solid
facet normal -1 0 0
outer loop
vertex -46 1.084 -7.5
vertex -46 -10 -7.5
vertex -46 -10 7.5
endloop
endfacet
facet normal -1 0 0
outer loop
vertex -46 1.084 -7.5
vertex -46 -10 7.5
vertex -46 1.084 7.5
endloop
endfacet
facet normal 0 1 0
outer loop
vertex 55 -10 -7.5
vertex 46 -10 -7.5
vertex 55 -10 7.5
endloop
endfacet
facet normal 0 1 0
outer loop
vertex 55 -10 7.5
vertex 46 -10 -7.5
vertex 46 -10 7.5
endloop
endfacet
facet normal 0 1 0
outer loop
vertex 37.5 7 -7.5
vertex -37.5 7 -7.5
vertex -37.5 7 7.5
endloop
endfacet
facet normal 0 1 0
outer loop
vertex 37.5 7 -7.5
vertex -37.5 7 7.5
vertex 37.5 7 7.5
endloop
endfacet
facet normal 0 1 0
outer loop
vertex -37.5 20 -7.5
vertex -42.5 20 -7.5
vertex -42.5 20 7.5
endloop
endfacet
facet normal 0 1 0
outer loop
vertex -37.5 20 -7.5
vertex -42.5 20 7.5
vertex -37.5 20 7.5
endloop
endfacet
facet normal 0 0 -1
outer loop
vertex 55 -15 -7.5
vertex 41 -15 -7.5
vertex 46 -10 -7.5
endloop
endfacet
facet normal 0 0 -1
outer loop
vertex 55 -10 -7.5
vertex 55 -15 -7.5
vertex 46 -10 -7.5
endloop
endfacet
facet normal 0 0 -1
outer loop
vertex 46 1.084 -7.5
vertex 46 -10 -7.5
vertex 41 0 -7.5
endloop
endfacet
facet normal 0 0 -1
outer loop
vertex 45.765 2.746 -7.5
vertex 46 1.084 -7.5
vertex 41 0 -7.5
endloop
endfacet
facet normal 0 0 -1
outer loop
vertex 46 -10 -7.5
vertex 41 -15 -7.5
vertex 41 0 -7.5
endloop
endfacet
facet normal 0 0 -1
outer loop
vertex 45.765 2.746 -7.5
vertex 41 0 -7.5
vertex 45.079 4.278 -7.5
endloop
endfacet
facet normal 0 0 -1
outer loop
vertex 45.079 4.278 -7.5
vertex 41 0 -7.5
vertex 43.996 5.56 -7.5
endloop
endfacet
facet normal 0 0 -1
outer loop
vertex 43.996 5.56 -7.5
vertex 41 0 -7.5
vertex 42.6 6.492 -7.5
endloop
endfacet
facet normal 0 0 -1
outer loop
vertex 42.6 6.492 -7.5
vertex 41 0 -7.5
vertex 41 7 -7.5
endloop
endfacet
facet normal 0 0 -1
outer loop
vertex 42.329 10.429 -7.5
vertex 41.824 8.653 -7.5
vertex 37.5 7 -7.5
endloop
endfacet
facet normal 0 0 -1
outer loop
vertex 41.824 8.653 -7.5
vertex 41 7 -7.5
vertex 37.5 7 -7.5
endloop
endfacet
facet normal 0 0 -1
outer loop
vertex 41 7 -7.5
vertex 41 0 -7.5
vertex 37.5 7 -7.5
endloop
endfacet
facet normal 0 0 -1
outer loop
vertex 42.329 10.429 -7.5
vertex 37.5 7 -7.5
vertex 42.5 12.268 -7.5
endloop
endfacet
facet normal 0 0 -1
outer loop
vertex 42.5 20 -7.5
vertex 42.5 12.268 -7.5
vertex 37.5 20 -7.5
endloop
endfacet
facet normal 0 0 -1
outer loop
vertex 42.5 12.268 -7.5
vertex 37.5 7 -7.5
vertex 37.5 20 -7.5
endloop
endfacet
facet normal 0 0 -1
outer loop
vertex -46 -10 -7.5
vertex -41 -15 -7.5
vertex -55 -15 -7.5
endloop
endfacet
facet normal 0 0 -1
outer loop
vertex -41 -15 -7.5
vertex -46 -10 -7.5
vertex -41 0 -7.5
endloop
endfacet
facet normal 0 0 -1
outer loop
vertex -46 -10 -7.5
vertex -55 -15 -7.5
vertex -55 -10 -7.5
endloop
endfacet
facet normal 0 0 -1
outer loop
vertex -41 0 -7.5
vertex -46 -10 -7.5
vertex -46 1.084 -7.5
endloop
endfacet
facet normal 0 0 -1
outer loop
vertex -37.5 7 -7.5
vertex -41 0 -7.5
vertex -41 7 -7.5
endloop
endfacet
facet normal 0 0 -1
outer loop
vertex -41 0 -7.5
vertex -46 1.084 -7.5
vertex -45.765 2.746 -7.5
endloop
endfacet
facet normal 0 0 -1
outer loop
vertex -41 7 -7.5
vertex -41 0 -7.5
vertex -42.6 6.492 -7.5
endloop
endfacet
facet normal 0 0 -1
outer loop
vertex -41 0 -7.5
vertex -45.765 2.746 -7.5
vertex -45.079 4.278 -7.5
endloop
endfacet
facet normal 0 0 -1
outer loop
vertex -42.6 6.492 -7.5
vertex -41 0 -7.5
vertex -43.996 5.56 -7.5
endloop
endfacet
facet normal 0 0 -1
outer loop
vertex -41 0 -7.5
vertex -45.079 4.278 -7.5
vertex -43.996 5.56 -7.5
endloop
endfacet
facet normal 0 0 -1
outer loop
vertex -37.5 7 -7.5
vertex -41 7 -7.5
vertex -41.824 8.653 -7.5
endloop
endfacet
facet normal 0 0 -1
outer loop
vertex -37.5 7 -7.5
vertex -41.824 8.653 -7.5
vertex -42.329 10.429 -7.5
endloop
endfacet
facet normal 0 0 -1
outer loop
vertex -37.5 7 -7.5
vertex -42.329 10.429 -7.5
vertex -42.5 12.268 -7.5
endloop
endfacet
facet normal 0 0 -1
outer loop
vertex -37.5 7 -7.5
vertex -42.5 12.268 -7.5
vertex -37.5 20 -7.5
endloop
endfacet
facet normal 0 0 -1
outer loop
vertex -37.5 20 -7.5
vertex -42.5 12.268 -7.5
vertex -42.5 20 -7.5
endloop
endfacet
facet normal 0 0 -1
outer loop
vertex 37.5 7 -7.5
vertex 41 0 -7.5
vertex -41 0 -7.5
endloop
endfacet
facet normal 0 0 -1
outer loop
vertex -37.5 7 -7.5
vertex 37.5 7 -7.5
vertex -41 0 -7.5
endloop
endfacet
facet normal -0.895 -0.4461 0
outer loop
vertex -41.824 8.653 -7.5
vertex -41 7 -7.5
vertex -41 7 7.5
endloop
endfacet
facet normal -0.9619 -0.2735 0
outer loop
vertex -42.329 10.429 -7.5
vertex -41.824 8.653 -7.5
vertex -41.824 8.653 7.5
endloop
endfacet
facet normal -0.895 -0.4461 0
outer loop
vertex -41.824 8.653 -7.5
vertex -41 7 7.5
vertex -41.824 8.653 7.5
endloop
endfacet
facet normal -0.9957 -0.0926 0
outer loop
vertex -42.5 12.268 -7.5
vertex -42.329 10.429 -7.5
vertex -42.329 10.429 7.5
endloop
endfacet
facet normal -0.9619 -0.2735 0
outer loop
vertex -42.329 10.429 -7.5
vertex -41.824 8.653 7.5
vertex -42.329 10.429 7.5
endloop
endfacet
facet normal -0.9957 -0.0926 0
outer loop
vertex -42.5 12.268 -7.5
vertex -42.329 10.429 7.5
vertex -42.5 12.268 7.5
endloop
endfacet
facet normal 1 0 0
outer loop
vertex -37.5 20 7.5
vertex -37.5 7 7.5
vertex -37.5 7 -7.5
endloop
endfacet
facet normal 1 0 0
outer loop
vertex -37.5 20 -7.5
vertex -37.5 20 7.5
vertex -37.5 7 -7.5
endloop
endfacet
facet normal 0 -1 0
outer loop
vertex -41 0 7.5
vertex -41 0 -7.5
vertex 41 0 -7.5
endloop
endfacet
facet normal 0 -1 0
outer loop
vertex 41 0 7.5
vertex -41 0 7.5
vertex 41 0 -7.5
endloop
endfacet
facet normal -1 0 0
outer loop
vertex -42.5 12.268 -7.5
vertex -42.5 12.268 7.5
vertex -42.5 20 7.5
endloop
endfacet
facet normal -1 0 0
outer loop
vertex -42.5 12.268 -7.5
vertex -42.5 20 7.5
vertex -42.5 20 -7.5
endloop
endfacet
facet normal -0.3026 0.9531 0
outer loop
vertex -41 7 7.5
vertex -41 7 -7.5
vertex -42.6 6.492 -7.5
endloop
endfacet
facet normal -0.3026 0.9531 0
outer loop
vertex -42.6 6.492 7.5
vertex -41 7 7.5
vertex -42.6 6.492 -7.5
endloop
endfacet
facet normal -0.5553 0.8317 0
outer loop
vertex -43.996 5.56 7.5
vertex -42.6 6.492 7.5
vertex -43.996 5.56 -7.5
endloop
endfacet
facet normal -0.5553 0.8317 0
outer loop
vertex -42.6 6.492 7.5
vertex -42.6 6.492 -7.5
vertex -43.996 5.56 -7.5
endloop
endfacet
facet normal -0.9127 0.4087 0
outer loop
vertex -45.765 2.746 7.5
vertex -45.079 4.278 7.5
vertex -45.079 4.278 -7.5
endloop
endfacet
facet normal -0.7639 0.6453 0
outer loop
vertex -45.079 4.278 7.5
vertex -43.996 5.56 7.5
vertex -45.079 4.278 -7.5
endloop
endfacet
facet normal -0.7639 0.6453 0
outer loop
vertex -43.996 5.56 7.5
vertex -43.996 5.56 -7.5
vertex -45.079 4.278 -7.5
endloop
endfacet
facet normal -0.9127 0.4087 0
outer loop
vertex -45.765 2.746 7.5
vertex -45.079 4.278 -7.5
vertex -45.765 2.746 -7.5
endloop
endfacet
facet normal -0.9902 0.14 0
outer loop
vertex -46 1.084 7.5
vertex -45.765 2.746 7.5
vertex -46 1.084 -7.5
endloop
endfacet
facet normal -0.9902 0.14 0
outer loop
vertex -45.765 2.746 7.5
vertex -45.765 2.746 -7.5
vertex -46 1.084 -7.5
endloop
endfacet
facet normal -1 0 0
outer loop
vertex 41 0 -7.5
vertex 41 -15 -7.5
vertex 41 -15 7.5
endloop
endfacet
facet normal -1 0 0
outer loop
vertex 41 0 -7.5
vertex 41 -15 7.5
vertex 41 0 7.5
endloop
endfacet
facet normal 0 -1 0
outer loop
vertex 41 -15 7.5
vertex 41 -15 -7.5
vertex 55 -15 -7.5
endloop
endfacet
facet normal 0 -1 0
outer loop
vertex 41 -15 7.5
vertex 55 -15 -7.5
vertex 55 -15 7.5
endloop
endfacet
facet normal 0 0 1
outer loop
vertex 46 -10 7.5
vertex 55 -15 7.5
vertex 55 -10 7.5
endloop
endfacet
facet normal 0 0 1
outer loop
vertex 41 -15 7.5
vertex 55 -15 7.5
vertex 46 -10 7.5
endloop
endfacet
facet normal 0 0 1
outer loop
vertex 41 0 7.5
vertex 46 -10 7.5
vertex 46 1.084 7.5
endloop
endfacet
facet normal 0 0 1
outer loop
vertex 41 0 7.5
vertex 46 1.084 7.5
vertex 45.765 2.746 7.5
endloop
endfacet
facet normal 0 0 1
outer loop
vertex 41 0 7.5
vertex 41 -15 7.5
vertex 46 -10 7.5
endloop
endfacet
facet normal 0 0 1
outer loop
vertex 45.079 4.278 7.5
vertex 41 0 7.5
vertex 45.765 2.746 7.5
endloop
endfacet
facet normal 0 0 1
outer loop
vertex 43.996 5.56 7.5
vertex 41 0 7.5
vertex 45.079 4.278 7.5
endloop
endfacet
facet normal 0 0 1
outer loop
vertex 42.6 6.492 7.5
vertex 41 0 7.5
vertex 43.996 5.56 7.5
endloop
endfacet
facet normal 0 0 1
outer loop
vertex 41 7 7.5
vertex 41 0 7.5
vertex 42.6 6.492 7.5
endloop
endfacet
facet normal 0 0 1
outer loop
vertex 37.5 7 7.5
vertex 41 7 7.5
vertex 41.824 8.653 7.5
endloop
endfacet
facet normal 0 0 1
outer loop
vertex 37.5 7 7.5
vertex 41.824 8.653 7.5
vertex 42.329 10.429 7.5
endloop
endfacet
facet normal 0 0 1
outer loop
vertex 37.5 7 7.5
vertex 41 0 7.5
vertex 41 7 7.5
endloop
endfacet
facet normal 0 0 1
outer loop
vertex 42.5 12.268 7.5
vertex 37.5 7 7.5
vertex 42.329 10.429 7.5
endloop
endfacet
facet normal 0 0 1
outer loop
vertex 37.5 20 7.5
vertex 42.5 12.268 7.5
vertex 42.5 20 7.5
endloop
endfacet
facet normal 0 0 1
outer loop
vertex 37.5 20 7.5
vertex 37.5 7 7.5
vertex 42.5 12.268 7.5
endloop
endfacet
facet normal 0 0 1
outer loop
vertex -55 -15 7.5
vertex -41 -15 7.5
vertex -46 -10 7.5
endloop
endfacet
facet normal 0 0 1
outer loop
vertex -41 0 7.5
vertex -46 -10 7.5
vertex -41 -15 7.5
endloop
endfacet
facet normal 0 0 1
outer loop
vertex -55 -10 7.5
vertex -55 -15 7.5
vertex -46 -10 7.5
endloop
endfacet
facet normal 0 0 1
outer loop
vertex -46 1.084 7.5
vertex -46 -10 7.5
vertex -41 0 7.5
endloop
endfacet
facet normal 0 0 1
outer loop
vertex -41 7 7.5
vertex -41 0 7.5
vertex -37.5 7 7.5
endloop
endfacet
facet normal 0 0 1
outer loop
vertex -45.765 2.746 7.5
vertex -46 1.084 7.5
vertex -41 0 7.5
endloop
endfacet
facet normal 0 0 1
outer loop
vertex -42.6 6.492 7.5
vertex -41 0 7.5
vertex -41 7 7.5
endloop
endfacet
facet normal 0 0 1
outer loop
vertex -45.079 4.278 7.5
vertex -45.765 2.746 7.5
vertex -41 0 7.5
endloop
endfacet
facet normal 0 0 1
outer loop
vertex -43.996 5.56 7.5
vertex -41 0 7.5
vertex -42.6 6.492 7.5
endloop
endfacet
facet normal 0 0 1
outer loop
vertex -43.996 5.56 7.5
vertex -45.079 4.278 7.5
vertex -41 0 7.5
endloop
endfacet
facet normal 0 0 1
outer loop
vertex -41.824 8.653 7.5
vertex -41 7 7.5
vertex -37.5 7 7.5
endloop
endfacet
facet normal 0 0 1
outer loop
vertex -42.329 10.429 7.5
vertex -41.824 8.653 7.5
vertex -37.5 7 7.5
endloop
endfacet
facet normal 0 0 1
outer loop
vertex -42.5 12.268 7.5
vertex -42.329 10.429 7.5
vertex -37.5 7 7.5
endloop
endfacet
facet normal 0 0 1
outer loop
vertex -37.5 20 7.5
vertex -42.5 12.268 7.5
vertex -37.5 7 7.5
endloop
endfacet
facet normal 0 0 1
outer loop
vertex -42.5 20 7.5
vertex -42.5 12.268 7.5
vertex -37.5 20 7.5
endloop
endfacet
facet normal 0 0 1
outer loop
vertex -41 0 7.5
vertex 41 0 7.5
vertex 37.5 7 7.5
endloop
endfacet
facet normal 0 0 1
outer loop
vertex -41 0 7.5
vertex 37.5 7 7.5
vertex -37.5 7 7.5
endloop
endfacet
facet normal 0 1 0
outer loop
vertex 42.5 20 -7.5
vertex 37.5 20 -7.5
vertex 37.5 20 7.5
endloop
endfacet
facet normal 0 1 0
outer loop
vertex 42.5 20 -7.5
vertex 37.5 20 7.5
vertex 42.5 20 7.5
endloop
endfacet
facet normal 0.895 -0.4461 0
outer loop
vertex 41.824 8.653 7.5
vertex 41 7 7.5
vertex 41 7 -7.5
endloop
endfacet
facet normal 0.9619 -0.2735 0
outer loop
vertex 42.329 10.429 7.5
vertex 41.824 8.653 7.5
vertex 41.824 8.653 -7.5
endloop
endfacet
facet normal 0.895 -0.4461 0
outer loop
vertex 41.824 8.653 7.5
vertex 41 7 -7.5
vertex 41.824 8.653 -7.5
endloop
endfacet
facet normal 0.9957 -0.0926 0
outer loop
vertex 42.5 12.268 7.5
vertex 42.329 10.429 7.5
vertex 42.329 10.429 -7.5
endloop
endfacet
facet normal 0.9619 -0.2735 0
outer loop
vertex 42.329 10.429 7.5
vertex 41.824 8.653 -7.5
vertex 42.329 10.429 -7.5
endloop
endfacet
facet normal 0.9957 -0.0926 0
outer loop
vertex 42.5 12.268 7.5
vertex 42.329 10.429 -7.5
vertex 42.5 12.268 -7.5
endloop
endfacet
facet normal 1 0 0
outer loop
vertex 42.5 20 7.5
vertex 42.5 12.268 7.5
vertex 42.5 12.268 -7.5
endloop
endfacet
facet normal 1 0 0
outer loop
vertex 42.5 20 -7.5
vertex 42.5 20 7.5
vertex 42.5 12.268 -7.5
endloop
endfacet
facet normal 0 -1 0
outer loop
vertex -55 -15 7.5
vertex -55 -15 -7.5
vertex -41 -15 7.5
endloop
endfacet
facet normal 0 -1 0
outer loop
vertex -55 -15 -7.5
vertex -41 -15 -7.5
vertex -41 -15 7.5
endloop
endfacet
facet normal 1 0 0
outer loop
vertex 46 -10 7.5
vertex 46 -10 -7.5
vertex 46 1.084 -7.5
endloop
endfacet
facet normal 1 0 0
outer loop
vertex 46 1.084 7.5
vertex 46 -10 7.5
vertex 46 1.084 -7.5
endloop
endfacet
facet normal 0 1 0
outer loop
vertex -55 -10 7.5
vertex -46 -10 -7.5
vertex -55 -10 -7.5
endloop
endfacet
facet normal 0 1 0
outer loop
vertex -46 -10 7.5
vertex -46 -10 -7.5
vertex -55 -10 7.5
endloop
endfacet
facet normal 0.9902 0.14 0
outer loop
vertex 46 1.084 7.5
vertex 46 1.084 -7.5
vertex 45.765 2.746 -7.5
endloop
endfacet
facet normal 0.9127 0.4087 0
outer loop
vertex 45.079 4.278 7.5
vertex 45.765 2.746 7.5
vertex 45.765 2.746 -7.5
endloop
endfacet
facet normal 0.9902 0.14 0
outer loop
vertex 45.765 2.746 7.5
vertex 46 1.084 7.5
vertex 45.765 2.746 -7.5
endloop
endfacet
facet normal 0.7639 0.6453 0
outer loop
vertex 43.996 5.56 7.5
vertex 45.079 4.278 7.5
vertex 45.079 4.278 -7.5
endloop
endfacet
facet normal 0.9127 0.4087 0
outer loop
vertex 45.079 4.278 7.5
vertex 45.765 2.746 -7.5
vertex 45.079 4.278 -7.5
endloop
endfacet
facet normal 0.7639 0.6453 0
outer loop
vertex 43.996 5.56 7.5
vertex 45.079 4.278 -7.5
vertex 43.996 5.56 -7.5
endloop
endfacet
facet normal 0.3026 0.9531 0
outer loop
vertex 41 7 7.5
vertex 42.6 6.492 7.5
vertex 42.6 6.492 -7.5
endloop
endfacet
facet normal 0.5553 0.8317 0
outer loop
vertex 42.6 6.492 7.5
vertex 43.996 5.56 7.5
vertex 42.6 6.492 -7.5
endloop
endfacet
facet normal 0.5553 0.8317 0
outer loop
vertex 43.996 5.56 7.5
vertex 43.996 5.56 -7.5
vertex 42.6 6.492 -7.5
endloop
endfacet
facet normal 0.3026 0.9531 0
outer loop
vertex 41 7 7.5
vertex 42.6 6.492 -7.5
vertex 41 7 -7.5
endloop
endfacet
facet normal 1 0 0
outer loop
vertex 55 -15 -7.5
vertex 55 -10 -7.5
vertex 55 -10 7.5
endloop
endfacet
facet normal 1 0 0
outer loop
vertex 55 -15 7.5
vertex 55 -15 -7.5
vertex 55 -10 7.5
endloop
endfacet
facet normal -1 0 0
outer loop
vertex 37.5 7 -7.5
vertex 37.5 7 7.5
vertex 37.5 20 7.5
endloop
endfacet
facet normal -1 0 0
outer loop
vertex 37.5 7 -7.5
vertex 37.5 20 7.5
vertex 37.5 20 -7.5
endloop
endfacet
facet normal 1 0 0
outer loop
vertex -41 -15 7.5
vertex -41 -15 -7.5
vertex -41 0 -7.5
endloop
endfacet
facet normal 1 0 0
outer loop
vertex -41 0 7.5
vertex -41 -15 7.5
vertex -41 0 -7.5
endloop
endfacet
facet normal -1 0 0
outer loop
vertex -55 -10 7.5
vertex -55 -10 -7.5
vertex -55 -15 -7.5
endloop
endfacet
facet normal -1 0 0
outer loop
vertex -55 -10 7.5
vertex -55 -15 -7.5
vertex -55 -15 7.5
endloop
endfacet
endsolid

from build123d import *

# Parameters (mm, degrees)
SKETCH1_W           = 82
SKETCH1_H           = 15
BOSS_EXTRUDE1_DEPTH = 7
SKETCH3_W           = 5
SKETCH3_H           = 15
BOSS_EXTRUDE2_DEPTH = 13
FILLET1_R           = 10
SKETCH4_W           = 5
SKETCH4_H           = 22
BOSS_EXTRUDE3_DEPTH = 15
FILLET2_R           = 6
SKETCH5_W           = 15
SKETCH5_H           = 5
BOSS_EXTRUDE4_DEPTH = 9


with BuildPart() as part:
    # Sketch1 → Boss-Extrude1 (new body)
    with BuildSketch(Plane(origin=(0, 0, 0), x_dir=(1, 0, 0), z_dir=(0, 1, 0))):
        Rectangle(SKETCH1_W, SKETCH1_H)
    extrude(amount=BOSS_EXTRUDE1_DEPTH)

    # Sketch3 → Boss-Extrude2 (add)
    with BuildSketch(Plane(origin=(0, 7, 0), x_dir=(1, 0, 0), z_dir=(0, 1, 0))):
        with Locations((-40, 0)):
            Rectangle(SKETCH3_W, SKETCH3_H)
        with Locations((40, 0)):
            Rectangle(SKETCH3_W, SKETCH3_H)
    extrude(amount=BOSS_EXTRUDE2_DEPTH)

    # Fillet1
    # the kernel refuses this fillet: 10 mm, written as the material it takes off along each edge
    with BuildSketch(Plane(origin=(42.5, 7, -20.669567191), x_dir=(-1, 0, 0), z_dir=(0, 0, 1)), Plane(origin=(-42.5, 7, 20.669567191), x_dir=(1, 0, 0), z_dir=(0, 0, -1))) as fillet1_piece_1:
        with BuildLine():
            CenterArc((10, -5.267826876), FILLET1_R, 148.211669383, 31.788330617)
            Line((0, -5.267826876), (-0.2, -5.267826876))
            Line((-0.2, -5.267826876), (-0.2, 0))
            Line((-0.2, 0), (0, 0.2))
            ThreePointArc((0, 0.2), (0.75, 0.2), (1.33, 0.105356538))
            Line((1.33, 0.105356538), (1.5, 0))
        make_face()
    extrude(amount=41.339134382, mode=Mode.SUBTRACT)

    # Sketch4 → Boss-Extrude3 (add)
    with BuildSketch(Plane(origin=(0, 0, -7.5), x_dir=(-1, 0, 0), z_dir=(0, 0, -1))):
        with Locations((-43.5, -4)):
            Rectangle(SKETCH4_W, SKETCH4_H)
        with Locations((43.5, -4)):
            Rectangle(SKETCH4_W, SKETCH4_H)
    extrude(amount=-BOSS_EXTRUDE3_DEPTH)

    # Fillet2
    # the kernel refuses this fillet: 6 mm, written as the material it takes off along each edge
    with BuildSketch(Plane(origin=(46, 7, -22.290199458), x_dir=(-1, 0, 0), z_dir=(0, 0, 1))) as fillet2_piece_1_section:
        with BuildLine():
            CenterArc((6, 5.916079783), FILLET2_R, 180, 80.405931773)
            Line((0, 5.916079783), (-0.12, 5.916079783))
            Line((-0.12, 5.916079783), (-0.12, 0))
            Line((-0.12, 0), (0, -0.12))
            ThreePointArc((0, -0.12), (2.5, -0.12), (4.98, -0.118321596))
            Line((4.98, -0.118321596), (5, 0))
        make_face()
    fillet2_piece_1 = extrude(amount=44.580398916, mode=Mode.PRIVATE)
    fillet2_piece_1 = fillet2_piece_1 - Plane(origin=(32.5, 12.267826876, 0), x_dir=(-1, 0, 0), z_dir=(0, 0, -1)) * Cylinder(10, 113, mode=Mode.PRIVATE)
    add(fillet2_piece_1, mode=Mode.SUBTRACT)
    with BuildSketch(Plane(origin=(-46, 7, -22.290199458), x_dir=(1, 0, 0), z_dir=(0, 0, 1))) as fillet2_piece_2_section:
        with BuildLine():
            CenterArc((6, -5.916079783), FILLET2_R, 99.594068227, 80.405931773)
            Line((0, -5.916079783), (-0.12, -5.916079783))
            Line((-0.12, -5.916079783), (-0.12, 0))
            Line((-0.12, 0), (0, 0.12))
            ThreePointArc((0, 0.12), (2.5, 0.12), (4.98, 0.118321596))
            Line((4.98, 0.118321596), (5, 0))
        make_face()
    fillet2_piece_2 = extrude(amount=44.580398916, mode=Mode.PRIVATE)
    fillet2_piece_2 = fillet2_piece_2 - Plane(origin=(-32.5, 12.267826876, 0), x_dir=(1, 0, 0), z_dir=(0, 0, 1)) * Cylinder(10, 113, mode=Mode.PRIVATE)
    add(fillet2_piece_2, mode=Mode.SUBTRACT)

    # Sketch5 → Boss-Extrude4 (add)
    with BuildSketch(Plane.ZY.offset(46)):
        with Locations((0, -12.5)):
            Rectangle(SKETCH5_W, SKETCH5_H)
    boss_extrude4 = extrude(amount=BOSS_EXTRUDE4_DEPTH)

    # Mirror1: Boss-Extrude4 across plane
    add(boss_extrude4.mirror(Plane(origin=(0, 0, 0), x_dir=(0, 0, 1), z_dir=(1, 0, 0))))


solid = part.part
